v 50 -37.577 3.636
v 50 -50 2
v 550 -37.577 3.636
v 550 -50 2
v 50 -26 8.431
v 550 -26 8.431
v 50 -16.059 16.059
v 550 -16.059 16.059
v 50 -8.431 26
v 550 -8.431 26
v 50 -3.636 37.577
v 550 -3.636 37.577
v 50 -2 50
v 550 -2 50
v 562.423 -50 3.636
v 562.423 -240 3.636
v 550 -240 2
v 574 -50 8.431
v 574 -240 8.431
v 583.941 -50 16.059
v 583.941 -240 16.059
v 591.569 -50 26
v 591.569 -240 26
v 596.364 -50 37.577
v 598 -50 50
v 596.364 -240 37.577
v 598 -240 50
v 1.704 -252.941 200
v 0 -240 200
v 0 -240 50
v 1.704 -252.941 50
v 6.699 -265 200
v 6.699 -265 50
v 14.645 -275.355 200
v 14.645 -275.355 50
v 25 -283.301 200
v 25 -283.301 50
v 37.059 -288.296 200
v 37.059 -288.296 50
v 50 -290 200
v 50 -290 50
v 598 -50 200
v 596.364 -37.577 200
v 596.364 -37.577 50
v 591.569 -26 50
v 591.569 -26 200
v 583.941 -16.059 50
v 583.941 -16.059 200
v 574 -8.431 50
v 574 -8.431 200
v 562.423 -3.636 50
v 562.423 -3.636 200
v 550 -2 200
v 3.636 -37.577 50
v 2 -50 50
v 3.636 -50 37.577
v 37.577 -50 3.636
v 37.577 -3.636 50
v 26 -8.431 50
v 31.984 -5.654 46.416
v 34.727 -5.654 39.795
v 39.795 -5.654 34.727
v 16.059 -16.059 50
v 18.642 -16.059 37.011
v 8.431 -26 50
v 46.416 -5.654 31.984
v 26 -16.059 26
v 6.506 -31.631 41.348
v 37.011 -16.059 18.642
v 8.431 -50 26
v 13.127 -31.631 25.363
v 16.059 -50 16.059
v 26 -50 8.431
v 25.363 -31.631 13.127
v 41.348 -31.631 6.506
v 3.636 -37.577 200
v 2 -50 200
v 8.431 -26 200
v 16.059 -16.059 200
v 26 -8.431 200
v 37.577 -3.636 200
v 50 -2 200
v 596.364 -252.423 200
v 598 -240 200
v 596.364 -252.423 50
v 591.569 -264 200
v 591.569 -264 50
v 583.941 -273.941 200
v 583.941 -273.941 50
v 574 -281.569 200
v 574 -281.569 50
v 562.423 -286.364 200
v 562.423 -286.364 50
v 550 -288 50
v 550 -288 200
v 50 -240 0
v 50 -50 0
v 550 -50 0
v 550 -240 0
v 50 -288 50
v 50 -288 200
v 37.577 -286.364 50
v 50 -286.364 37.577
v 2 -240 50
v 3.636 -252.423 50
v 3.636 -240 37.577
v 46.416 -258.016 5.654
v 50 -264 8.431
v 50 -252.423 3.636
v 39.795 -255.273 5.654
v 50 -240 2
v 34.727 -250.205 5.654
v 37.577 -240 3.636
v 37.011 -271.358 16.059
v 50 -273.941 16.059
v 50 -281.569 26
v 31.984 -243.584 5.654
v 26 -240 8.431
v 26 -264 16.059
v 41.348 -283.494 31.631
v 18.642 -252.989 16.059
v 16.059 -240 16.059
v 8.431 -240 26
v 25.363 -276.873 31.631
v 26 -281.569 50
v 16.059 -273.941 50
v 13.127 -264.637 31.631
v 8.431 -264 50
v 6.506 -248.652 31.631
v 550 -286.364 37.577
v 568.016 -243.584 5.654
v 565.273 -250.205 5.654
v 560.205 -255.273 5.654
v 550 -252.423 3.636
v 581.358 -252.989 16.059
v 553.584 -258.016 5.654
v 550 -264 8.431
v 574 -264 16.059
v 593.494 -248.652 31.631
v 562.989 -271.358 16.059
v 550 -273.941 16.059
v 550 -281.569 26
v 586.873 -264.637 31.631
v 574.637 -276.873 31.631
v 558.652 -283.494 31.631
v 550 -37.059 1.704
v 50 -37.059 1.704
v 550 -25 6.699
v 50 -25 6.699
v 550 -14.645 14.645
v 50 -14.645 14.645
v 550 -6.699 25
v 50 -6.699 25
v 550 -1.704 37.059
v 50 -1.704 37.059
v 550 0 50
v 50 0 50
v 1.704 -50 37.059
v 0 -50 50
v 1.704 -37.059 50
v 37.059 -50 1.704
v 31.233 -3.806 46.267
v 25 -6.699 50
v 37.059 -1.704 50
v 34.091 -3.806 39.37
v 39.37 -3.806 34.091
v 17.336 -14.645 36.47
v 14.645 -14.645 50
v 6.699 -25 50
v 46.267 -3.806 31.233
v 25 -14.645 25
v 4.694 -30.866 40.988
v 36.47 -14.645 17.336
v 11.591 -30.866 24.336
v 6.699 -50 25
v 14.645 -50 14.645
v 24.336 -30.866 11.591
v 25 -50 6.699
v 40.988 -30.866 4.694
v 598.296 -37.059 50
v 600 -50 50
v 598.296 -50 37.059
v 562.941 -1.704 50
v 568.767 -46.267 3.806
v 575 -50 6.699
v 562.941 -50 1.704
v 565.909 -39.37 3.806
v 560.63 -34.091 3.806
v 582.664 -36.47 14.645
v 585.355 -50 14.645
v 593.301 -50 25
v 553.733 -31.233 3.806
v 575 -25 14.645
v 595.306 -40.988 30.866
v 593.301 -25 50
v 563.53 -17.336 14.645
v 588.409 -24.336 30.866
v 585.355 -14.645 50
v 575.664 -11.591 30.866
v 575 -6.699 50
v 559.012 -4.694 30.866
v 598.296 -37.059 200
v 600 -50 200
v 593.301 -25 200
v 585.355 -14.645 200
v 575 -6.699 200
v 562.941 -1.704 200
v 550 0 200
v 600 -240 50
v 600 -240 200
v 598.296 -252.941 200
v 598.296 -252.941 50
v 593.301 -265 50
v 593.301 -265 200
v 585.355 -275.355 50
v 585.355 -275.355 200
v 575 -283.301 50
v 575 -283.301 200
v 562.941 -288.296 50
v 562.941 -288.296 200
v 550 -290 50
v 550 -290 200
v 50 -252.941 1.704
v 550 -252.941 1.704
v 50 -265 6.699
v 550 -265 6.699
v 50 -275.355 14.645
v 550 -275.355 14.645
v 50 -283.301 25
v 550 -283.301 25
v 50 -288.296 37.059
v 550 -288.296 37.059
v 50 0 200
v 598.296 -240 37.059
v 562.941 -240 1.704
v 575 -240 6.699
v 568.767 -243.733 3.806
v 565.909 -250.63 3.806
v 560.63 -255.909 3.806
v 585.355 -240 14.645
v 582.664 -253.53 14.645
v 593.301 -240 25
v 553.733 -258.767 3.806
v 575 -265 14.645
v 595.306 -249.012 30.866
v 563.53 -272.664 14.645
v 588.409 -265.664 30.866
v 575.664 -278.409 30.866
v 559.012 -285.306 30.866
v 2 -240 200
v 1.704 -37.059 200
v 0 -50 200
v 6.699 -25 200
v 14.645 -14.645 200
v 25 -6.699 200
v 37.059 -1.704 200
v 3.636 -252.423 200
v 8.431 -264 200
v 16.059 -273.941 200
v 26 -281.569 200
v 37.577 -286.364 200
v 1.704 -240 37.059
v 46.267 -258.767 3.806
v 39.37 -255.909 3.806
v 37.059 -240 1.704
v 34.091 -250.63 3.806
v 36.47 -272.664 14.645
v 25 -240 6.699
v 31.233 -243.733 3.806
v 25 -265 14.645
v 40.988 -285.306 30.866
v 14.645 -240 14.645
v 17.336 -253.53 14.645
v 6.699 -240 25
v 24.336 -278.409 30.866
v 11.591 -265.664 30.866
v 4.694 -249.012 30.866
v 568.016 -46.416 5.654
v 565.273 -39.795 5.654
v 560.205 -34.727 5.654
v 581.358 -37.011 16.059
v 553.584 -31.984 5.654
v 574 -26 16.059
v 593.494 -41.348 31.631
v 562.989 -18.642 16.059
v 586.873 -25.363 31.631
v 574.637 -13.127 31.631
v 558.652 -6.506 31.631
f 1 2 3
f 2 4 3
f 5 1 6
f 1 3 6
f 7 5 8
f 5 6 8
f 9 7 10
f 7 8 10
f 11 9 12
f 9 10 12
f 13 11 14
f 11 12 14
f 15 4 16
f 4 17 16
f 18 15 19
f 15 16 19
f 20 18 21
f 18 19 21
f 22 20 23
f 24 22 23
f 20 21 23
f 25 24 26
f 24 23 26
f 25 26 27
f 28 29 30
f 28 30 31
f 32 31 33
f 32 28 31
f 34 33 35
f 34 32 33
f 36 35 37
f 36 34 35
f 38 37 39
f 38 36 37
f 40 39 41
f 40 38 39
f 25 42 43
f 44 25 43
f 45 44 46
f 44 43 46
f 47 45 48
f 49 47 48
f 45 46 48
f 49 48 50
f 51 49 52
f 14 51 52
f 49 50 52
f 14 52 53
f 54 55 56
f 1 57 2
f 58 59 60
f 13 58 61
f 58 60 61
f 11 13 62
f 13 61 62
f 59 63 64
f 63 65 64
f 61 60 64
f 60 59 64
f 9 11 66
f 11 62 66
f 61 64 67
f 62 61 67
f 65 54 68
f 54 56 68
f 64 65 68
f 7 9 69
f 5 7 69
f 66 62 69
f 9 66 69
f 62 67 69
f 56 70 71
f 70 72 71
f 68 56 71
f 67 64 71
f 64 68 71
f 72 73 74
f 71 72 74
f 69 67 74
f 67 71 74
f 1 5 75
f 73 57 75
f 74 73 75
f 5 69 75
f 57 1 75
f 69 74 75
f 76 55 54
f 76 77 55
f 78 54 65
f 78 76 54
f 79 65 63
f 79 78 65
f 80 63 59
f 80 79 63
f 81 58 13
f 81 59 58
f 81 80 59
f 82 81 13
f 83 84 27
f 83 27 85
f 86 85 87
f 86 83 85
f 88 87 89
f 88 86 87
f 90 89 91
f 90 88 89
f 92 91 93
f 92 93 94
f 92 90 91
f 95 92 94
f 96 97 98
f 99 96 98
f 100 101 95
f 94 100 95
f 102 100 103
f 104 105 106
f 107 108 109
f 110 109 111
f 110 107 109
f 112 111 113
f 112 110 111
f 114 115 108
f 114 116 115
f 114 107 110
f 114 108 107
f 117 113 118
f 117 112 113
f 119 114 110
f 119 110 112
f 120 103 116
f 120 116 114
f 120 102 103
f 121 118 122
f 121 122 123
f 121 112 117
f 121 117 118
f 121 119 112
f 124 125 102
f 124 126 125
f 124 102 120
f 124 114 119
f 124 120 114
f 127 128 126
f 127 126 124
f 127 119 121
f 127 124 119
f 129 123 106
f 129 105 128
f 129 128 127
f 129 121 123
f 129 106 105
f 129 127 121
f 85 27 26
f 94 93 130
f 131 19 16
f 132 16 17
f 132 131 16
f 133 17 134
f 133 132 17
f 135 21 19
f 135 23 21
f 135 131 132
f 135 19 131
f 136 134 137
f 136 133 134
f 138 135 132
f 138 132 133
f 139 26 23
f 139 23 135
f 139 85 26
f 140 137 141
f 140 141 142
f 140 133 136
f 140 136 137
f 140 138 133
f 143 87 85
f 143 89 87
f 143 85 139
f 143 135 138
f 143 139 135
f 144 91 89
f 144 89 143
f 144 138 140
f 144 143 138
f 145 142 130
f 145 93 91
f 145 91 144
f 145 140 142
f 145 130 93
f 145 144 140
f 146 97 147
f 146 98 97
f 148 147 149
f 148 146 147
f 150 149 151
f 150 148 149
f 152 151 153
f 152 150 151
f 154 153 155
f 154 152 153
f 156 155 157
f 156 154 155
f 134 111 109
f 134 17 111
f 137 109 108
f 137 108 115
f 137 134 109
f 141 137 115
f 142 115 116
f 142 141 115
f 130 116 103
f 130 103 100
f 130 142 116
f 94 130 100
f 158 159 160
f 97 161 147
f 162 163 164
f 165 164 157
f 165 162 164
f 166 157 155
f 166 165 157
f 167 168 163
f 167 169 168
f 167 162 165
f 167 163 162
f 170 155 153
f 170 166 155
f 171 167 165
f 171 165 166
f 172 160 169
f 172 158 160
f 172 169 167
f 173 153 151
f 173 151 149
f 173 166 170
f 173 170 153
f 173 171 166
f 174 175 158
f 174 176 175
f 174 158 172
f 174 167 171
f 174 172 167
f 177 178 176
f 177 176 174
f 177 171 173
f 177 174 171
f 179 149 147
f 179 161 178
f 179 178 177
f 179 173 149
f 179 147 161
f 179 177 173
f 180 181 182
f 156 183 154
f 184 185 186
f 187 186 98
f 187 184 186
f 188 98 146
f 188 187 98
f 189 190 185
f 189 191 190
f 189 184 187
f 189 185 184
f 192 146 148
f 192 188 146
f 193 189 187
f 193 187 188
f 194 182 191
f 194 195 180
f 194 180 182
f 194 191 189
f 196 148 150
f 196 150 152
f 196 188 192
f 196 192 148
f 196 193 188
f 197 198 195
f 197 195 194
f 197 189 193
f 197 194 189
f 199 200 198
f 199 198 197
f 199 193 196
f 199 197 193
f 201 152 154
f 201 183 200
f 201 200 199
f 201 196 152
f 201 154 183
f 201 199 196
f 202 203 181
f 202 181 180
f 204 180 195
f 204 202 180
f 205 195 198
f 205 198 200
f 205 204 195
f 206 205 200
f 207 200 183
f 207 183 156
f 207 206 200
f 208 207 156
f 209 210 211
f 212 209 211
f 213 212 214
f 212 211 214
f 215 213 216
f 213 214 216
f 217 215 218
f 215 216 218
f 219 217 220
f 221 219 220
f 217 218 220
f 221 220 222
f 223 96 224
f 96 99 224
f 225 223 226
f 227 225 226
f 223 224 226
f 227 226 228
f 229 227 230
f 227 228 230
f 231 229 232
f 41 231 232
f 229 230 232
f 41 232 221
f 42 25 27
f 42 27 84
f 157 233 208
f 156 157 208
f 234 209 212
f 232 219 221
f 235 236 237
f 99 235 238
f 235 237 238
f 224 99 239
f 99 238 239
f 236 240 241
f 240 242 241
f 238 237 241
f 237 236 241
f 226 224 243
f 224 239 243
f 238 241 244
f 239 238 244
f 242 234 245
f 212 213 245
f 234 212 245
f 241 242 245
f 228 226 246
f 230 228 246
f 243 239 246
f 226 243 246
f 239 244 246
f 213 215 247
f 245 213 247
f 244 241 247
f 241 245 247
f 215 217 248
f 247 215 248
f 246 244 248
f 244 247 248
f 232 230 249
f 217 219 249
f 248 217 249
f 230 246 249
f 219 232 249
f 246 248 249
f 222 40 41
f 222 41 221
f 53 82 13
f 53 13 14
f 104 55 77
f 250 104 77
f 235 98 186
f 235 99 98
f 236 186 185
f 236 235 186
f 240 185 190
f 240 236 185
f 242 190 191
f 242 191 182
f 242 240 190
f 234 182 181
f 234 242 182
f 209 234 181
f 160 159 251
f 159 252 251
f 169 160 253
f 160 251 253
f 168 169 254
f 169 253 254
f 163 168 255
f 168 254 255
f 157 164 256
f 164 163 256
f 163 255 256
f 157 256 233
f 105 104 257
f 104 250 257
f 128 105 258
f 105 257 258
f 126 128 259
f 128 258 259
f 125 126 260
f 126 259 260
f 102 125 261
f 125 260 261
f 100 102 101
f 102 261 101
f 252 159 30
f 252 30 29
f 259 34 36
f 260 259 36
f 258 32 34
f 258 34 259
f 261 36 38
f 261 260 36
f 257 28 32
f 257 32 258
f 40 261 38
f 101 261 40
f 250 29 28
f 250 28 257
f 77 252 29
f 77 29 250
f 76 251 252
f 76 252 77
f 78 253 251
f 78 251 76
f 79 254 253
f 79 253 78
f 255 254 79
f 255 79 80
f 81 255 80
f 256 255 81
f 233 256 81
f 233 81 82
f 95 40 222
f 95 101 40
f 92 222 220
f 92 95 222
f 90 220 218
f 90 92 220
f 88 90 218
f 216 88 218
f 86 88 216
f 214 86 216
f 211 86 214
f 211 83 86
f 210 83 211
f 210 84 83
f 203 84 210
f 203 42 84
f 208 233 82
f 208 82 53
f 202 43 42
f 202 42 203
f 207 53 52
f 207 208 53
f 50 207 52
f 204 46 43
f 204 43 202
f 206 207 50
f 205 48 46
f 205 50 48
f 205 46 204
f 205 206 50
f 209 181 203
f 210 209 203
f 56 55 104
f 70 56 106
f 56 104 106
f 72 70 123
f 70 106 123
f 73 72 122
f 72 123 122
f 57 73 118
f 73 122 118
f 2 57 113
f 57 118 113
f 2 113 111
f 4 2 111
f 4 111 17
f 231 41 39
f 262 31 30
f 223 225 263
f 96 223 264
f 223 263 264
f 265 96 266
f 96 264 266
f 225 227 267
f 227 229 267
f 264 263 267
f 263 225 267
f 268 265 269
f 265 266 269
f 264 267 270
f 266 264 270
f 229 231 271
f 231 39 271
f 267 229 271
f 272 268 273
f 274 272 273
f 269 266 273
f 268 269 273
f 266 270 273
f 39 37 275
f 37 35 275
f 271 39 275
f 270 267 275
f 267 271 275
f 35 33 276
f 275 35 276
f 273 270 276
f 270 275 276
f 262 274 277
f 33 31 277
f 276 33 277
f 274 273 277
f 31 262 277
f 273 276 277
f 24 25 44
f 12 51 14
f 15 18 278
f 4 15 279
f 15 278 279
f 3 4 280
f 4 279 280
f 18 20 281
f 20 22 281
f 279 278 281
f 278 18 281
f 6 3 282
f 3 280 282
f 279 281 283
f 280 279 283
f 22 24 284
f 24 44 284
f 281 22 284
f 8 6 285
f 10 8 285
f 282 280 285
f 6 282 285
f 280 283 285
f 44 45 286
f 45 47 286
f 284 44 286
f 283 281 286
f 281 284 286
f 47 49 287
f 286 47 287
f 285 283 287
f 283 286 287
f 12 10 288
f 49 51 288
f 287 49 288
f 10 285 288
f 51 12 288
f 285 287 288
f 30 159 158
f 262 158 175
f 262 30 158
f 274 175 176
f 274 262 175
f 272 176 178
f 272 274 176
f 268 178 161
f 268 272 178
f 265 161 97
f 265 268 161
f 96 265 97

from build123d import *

# Parameters (mm, degrees)
F0_W     = 600
F0_H     = 200
F1_DEPTH = 290
F2_R     = 50
F3_T     = -2


with BuildPart() as f1:
    # F0 (on Front) → F1 (new body)
    with BuildSketch(Plane.XZ):
        with Locations((300, 100)):
            Rectangle(F0_W, F0_H)
    extrude(amount=F1_DEPTH)

    # F2
    f2_edges = [f1.edges().sort_by_distance(p)[0] for p in [
        (600, -290, 100),
        (0, -290, 100),
        (600, 0, 100),
        (600, -145, 0),
        (300, -290, 0),
        (0, -145, 0),
        (0, 0, 100),
        (300, 0, 0),
    ]]
    fillet(f2_edges, radius=F2_R)

    # F3
    f3_openings = [f1.faces().sort_by_distance(p)[0] for p in [
        (300, -145, 200),
    ]]
    offset(amount=F3_T, openings=f3_openings)


solid = f1.part
